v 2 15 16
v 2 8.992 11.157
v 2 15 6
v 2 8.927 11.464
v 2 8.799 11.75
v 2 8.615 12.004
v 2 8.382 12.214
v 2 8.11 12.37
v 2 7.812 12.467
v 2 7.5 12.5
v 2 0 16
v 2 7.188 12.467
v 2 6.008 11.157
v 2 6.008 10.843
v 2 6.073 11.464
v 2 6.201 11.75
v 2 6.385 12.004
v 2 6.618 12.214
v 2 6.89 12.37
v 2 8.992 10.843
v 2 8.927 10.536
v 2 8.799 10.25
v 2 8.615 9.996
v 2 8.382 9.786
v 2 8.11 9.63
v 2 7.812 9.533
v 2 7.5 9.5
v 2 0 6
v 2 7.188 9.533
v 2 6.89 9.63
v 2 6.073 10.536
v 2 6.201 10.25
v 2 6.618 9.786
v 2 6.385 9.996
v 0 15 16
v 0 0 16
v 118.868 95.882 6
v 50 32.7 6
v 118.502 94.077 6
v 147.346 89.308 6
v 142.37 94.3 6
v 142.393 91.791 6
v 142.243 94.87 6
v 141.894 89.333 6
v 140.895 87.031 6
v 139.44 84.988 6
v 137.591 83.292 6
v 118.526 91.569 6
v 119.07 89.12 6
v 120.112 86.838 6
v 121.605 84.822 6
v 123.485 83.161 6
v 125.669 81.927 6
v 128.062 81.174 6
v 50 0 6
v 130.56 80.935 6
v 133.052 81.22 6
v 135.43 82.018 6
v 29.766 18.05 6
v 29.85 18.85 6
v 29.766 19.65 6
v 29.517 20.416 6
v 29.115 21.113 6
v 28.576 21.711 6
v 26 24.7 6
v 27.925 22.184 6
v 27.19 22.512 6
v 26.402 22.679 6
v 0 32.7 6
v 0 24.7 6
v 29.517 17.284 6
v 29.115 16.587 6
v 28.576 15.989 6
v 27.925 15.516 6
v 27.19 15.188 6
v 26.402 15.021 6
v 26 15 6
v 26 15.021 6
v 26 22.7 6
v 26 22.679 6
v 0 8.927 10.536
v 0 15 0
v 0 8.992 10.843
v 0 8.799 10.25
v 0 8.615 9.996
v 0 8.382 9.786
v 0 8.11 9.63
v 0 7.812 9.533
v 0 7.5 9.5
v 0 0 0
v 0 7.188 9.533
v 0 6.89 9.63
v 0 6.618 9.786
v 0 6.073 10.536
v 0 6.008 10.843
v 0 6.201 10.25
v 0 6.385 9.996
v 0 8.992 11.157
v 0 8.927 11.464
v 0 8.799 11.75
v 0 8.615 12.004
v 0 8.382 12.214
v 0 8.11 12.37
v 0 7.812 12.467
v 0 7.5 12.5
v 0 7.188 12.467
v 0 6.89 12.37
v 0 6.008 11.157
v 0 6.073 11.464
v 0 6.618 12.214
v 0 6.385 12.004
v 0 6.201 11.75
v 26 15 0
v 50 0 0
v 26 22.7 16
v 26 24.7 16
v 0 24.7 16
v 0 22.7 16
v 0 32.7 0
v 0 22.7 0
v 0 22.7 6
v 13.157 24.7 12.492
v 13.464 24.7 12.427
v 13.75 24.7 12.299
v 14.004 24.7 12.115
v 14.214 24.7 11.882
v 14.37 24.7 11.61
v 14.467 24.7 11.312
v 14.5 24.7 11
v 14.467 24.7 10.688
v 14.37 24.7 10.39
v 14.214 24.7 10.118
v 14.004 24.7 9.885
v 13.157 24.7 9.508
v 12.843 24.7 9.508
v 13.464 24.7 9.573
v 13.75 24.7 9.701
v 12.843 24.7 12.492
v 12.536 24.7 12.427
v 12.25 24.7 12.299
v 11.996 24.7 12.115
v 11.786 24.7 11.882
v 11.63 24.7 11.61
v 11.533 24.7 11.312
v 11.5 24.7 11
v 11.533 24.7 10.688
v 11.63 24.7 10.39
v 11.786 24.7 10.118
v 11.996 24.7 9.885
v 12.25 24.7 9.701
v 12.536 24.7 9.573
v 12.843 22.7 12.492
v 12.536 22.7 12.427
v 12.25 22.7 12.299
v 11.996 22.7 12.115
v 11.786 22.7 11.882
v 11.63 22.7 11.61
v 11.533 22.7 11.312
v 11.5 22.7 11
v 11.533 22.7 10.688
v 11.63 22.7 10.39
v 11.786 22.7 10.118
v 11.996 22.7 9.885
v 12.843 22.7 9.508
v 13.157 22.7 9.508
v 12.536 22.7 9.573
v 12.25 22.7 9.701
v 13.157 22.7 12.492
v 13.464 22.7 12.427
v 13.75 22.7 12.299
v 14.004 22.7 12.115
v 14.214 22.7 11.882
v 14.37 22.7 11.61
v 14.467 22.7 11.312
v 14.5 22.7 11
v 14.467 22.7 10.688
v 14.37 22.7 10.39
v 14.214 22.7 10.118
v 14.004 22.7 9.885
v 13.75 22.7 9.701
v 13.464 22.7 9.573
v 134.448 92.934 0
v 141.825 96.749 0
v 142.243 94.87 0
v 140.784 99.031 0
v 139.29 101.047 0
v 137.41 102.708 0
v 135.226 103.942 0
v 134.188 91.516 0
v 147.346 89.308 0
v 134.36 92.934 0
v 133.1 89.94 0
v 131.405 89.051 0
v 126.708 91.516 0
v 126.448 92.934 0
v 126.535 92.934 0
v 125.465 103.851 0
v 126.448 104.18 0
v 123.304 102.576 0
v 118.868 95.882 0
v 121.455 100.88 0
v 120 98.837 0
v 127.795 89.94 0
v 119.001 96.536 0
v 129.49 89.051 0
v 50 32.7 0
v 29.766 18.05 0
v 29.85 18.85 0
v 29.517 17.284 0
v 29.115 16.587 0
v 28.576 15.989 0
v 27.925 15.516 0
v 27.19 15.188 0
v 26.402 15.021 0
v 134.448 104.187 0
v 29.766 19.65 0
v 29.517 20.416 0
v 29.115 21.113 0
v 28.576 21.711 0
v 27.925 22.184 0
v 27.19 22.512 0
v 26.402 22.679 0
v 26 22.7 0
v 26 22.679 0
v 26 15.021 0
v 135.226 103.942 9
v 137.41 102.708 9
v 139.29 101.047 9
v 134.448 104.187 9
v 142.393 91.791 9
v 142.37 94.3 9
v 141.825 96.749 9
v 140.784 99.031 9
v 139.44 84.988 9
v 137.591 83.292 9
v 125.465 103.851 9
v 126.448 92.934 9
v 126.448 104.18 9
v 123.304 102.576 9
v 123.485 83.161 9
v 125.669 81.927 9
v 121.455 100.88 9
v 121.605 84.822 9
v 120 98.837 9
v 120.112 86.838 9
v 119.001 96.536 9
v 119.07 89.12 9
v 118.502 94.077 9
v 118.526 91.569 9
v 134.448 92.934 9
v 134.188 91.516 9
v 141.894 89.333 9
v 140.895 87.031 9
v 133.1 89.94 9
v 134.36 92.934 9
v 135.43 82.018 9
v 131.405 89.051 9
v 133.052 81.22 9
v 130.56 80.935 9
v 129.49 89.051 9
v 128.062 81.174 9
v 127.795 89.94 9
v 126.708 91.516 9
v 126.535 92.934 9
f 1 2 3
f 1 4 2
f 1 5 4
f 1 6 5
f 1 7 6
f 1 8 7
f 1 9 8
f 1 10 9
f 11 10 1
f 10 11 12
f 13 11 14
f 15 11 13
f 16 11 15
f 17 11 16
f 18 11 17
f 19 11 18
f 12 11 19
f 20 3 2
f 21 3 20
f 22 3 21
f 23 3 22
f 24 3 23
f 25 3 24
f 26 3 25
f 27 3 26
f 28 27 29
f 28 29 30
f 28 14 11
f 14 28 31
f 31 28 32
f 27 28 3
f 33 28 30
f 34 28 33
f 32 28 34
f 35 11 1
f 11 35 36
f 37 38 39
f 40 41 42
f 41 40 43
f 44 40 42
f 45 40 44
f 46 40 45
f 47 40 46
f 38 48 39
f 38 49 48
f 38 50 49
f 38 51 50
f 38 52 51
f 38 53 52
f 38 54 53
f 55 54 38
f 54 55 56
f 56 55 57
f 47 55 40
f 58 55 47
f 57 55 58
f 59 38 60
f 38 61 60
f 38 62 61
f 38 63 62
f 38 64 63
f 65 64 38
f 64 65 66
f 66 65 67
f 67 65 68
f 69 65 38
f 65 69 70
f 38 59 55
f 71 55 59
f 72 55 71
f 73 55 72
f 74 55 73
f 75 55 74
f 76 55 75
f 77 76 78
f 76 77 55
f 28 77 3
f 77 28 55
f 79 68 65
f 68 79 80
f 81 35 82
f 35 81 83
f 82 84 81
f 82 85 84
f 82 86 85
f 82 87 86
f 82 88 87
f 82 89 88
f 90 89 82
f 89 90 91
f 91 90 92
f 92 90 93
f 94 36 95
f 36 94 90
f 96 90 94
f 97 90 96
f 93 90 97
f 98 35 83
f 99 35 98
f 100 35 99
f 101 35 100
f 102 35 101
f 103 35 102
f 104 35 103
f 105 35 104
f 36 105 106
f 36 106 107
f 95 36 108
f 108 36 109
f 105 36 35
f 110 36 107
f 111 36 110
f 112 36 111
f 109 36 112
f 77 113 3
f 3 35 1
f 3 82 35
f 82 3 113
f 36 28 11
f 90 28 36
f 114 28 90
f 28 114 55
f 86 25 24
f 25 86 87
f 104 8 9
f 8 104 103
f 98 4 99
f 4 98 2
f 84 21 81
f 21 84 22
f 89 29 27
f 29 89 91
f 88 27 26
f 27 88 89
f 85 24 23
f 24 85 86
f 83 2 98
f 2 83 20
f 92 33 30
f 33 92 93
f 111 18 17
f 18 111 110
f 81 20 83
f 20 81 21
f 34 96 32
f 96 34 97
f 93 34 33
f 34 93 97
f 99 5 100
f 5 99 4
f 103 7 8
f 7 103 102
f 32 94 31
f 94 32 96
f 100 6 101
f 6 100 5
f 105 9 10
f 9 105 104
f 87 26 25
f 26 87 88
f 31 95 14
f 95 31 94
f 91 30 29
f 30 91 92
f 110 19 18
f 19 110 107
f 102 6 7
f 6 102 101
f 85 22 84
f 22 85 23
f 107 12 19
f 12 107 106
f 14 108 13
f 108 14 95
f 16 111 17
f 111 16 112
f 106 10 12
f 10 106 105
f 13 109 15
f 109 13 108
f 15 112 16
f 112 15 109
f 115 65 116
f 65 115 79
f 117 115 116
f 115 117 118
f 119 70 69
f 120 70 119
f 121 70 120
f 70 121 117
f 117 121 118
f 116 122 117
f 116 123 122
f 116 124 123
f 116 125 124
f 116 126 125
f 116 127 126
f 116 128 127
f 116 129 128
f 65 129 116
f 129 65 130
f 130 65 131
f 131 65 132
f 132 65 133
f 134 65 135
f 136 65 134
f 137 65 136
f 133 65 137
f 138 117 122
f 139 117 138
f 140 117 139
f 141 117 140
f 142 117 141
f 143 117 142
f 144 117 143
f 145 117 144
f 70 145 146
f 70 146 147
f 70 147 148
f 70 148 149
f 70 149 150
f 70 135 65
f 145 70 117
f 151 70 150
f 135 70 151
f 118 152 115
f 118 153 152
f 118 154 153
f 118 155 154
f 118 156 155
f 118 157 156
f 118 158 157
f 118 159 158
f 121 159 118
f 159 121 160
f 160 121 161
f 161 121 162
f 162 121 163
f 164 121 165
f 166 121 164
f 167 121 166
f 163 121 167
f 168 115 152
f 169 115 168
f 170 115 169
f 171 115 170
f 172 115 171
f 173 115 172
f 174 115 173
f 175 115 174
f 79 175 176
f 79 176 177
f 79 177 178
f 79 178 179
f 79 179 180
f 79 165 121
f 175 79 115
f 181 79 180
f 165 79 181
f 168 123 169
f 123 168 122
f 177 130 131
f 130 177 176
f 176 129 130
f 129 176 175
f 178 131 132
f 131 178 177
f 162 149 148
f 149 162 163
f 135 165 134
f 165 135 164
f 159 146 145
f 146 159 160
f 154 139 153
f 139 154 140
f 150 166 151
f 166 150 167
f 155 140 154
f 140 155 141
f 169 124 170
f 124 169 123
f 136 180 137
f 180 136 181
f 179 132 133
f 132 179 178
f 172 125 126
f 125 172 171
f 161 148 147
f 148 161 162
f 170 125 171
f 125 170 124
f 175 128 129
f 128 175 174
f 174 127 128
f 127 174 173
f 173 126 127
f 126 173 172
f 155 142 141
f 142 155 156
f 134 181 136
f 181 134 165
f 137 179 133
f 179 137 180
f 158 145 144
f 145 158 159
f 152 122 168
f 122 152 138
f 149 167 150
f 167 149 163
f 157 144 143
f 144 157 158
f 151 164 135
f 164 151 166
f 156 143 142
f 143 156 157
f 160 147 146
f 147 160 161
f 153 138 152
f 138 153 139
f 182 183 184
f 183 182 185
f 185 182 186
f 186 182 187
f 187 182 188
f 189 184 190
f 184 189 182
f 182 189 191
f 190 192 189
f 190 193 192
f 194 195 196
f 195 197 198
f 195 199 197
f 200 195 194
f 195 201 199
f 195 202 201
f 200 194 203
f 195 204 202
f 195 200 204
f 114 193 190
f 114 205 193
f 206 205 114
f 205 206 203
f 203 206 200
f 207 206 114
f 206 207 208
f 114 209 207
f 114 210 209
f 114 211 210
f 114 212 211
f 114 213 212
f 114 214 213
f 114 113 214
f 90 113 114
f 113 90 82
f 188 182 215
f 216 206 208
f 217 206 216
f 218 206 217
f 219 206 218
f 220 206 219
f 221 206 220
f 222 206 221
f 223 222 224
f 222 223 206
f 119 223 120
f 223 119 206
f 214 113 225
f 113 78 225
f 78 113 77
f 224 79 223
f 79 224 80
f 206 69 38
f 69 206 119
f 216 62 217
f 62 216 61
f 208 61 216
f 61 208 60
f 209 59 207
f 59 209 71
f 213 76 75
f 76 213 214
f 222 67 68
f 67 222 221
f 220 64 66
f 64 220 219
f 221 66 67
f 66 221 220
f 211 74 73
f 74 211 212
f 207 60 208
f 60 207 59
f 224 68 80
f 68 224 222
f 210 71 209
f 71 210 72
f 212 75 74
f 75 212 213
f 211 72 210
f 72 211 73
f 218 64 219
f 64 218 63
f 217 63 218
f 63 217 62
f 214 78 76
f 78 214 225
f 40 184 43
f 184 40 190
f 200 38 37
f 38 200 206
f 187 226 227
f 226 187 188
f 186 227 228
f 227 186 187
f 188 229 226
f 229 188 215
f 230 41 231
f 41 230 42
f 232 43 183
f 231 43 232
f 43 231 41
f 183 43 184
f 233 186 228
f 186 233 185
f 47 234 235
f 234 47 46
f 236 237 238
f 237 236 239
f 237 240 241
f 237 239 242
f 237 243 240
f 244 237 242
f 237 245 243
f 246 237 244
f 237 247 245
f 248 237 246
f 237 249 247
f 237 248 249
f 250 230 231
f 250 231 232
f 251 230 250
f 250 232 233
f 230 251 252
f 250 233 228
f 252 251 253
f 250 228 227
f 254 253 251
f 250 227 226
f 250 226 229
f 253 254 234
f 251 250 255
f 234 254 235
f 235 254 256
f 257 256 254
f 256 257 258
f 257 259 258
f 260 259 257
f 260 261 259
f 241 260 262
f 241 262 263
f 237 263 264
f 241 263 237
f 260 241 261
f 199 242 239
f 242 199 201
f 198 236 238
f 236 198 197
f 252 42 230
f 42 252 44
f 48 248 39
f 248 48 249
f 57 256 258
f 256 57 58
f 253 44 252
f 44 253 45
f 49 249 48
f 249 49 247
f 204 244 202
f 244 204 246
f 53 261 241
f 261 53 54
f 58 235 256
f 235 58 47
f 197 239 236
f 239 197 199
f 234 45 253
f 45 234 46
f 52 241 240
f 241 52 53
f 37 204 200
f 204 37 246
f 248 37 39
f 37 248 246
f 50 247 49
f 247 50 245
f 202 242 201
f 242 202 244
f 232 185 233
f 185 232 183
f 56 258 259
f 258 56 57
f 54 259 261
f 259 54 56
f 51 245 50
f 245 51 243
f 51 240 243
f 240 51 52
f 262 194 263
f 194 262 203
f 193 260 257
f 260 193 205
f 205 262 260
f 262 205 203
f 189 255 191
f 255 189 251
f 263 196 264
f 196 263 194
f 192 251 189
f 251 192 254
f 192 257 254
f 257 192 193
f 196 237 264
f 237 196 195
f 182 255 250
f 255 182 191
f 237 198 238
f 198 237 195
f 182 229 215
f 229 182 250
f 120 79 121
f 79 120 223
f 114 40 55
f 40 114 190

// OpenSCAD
grossura_Da_Peca = 6;
grossura_Da_Barra_Superior = 7.7;
altura_Do_Apoio_Alto = 10;
altura_Do_Apoio_Baixo = 15;
profundudade_Maxima_Da_Barra_Superior = 26;
distancia_Superior_Reta = 50;
distancia_Inferior_Reta = 80;
tamanho_Da_Aste_Que_Sobe = 110;
raio_Do_Furo = 4;
borda_Do_Furo_Pra_Fora = 10;
borda_Do_Furo_Pra_Cima = 10;
tamanho_Da_Lingueta = 10;
grossura_Da_Lingueta = 2;
raio_Do_Furo_Da_Lingueta = 1.5;
esquerda = false; // [true, false]

alturaTotal = altura_Do_Apoio_Baixo + altura_Do_Apoio_Alto + grossura_Da_Barra_Superior;
alturaDaAsteQueSobe = sqrt(alturaTotal*alturaTotal + (distancia_Inferior_Reta-distancia_Superior_Reta)*(distancia_Inferior_Reta-distancia_Superior_Reta));
anguloDaAste = acos(alturaTotal/alturaDaAsteQueSobe);

if(esquerda) {
	mirror([0,1,0]) peca();
} else {
	peca();
}



module peca(){
difference(){
union() {
	cube([profundudade_Maxima_Da_Barra_Superior, altura_Do_Apoio_Baixo,grossura_Da_Peca]);

	translate([0,0,grossura_Da_Peca])
		difference() {
			cube([grossura_Da_Lingueta, altura_Do_Apoio_Baixo, tamanho_Da_Lingueta]);
			translate ([-0.1, altura_Do_Apoio_Baixo/2, tamanho_Da_Lingueta/2])
				rotate ([0,90,0])
					cylinder (h = grossura_Da_Peca*2, r=raio_Do_Furo_Da_Lingueta, $fn=30);
		}

	translate([0,(altura_Do_Apoio_Baixo+grossura_Da_Barra_Superior),0])
		cube([profundudade_Maxima_Da_Barra_Superior,altura_Do_Apoio_Alto,grossura_Da_Peca]);
	translate([0,(altura_Do_Apoio_Baixo+grossura_Da_Barra_Superior),grossura_Da_Peca])
		difference () {
			cube([profundudade_Maxima_Da_Barra_Superior,grossura_Da_Lingueta,tamanho_Da_Lingueta]);
			translate ([profundudade_Maxima_Da_Barra_Superior/2, -0.1, tamanho_Da_Lingueta/2])
				rotate ([-90,0,0])
					cylinder (h = grossura_Da_Peca*2, r=raio_Do_Furo_Da_Lingueta, $fn=30);
		}


		difference() {translate([profundudade_Maxima_Da_Barra_Superior,0,0])
			cube([distancia_Inferior_Reta-profundudade_Maxima_Da_Barra_Superior,altura_Do_Apoio_Baixo+grossura_Da_Barra_Superior+altura_Do_Apoio_Alto,grossura_Da_Peca]);
			translate([profundudade_Maxima_Da_Barra_Superior,altura_Do_Apoio_Baixo+grossura_Da_Barra_Superior/2,-0.1])
				cylinder (h = grossura_Da_Peca*2, r=grossura_Da_Barra_Superior/2, $fn=30);
		}

	translate([distancia_Inferior_Reta,0,0])
		rotate([0,0,anguloDaAste])
			difference() {
				union() {
					cube([tamanho_Da_Aste_Que_Sobe,alturaDaAsteQueSobe,grossura_Da_Peca]);
					translate([tamanho_Da_Aste_Que_Sobe-borda_Do_Furo_Pra_Fora,alturaDaAsteQueSobe-borda_Do_Furo_Pra_Cima,0])
						cylinder (h = grossura_Da_Peca*1.5, r=raio_Do_Furo*3, $fn=30);
				}
				translate([tamanho_Da_Aste_Que_Sobe-borda_Do_Furo_Pra_Fora,alturaDaAsteQueSobe-borda_Do_Furo_Pra_Cima,-grossura_Da_Peca])
					rotate([0,0,90-anguloDaAste])
						union () {
							%cylinder (h = 5, r=75+55/2, $fn=30);
							cylinder (h = grossura_Da_Peca*3, r=raio_Do_Furo);
							translate([0,-raio_Do_Furo,0])
								cube([raio_Do_Furo*10,raio_Do_Furo*2,grossura_Da_Peca*3]);
						}
			}
}
 
translate([distancia_Superior_Reta,0,0])
	rotate([0,0,anguloDaAste]){
		translate([0,-100,-0.1]){
			cube([200,100,grossura_Da_Peca*3]);
		}
	}

}
}
